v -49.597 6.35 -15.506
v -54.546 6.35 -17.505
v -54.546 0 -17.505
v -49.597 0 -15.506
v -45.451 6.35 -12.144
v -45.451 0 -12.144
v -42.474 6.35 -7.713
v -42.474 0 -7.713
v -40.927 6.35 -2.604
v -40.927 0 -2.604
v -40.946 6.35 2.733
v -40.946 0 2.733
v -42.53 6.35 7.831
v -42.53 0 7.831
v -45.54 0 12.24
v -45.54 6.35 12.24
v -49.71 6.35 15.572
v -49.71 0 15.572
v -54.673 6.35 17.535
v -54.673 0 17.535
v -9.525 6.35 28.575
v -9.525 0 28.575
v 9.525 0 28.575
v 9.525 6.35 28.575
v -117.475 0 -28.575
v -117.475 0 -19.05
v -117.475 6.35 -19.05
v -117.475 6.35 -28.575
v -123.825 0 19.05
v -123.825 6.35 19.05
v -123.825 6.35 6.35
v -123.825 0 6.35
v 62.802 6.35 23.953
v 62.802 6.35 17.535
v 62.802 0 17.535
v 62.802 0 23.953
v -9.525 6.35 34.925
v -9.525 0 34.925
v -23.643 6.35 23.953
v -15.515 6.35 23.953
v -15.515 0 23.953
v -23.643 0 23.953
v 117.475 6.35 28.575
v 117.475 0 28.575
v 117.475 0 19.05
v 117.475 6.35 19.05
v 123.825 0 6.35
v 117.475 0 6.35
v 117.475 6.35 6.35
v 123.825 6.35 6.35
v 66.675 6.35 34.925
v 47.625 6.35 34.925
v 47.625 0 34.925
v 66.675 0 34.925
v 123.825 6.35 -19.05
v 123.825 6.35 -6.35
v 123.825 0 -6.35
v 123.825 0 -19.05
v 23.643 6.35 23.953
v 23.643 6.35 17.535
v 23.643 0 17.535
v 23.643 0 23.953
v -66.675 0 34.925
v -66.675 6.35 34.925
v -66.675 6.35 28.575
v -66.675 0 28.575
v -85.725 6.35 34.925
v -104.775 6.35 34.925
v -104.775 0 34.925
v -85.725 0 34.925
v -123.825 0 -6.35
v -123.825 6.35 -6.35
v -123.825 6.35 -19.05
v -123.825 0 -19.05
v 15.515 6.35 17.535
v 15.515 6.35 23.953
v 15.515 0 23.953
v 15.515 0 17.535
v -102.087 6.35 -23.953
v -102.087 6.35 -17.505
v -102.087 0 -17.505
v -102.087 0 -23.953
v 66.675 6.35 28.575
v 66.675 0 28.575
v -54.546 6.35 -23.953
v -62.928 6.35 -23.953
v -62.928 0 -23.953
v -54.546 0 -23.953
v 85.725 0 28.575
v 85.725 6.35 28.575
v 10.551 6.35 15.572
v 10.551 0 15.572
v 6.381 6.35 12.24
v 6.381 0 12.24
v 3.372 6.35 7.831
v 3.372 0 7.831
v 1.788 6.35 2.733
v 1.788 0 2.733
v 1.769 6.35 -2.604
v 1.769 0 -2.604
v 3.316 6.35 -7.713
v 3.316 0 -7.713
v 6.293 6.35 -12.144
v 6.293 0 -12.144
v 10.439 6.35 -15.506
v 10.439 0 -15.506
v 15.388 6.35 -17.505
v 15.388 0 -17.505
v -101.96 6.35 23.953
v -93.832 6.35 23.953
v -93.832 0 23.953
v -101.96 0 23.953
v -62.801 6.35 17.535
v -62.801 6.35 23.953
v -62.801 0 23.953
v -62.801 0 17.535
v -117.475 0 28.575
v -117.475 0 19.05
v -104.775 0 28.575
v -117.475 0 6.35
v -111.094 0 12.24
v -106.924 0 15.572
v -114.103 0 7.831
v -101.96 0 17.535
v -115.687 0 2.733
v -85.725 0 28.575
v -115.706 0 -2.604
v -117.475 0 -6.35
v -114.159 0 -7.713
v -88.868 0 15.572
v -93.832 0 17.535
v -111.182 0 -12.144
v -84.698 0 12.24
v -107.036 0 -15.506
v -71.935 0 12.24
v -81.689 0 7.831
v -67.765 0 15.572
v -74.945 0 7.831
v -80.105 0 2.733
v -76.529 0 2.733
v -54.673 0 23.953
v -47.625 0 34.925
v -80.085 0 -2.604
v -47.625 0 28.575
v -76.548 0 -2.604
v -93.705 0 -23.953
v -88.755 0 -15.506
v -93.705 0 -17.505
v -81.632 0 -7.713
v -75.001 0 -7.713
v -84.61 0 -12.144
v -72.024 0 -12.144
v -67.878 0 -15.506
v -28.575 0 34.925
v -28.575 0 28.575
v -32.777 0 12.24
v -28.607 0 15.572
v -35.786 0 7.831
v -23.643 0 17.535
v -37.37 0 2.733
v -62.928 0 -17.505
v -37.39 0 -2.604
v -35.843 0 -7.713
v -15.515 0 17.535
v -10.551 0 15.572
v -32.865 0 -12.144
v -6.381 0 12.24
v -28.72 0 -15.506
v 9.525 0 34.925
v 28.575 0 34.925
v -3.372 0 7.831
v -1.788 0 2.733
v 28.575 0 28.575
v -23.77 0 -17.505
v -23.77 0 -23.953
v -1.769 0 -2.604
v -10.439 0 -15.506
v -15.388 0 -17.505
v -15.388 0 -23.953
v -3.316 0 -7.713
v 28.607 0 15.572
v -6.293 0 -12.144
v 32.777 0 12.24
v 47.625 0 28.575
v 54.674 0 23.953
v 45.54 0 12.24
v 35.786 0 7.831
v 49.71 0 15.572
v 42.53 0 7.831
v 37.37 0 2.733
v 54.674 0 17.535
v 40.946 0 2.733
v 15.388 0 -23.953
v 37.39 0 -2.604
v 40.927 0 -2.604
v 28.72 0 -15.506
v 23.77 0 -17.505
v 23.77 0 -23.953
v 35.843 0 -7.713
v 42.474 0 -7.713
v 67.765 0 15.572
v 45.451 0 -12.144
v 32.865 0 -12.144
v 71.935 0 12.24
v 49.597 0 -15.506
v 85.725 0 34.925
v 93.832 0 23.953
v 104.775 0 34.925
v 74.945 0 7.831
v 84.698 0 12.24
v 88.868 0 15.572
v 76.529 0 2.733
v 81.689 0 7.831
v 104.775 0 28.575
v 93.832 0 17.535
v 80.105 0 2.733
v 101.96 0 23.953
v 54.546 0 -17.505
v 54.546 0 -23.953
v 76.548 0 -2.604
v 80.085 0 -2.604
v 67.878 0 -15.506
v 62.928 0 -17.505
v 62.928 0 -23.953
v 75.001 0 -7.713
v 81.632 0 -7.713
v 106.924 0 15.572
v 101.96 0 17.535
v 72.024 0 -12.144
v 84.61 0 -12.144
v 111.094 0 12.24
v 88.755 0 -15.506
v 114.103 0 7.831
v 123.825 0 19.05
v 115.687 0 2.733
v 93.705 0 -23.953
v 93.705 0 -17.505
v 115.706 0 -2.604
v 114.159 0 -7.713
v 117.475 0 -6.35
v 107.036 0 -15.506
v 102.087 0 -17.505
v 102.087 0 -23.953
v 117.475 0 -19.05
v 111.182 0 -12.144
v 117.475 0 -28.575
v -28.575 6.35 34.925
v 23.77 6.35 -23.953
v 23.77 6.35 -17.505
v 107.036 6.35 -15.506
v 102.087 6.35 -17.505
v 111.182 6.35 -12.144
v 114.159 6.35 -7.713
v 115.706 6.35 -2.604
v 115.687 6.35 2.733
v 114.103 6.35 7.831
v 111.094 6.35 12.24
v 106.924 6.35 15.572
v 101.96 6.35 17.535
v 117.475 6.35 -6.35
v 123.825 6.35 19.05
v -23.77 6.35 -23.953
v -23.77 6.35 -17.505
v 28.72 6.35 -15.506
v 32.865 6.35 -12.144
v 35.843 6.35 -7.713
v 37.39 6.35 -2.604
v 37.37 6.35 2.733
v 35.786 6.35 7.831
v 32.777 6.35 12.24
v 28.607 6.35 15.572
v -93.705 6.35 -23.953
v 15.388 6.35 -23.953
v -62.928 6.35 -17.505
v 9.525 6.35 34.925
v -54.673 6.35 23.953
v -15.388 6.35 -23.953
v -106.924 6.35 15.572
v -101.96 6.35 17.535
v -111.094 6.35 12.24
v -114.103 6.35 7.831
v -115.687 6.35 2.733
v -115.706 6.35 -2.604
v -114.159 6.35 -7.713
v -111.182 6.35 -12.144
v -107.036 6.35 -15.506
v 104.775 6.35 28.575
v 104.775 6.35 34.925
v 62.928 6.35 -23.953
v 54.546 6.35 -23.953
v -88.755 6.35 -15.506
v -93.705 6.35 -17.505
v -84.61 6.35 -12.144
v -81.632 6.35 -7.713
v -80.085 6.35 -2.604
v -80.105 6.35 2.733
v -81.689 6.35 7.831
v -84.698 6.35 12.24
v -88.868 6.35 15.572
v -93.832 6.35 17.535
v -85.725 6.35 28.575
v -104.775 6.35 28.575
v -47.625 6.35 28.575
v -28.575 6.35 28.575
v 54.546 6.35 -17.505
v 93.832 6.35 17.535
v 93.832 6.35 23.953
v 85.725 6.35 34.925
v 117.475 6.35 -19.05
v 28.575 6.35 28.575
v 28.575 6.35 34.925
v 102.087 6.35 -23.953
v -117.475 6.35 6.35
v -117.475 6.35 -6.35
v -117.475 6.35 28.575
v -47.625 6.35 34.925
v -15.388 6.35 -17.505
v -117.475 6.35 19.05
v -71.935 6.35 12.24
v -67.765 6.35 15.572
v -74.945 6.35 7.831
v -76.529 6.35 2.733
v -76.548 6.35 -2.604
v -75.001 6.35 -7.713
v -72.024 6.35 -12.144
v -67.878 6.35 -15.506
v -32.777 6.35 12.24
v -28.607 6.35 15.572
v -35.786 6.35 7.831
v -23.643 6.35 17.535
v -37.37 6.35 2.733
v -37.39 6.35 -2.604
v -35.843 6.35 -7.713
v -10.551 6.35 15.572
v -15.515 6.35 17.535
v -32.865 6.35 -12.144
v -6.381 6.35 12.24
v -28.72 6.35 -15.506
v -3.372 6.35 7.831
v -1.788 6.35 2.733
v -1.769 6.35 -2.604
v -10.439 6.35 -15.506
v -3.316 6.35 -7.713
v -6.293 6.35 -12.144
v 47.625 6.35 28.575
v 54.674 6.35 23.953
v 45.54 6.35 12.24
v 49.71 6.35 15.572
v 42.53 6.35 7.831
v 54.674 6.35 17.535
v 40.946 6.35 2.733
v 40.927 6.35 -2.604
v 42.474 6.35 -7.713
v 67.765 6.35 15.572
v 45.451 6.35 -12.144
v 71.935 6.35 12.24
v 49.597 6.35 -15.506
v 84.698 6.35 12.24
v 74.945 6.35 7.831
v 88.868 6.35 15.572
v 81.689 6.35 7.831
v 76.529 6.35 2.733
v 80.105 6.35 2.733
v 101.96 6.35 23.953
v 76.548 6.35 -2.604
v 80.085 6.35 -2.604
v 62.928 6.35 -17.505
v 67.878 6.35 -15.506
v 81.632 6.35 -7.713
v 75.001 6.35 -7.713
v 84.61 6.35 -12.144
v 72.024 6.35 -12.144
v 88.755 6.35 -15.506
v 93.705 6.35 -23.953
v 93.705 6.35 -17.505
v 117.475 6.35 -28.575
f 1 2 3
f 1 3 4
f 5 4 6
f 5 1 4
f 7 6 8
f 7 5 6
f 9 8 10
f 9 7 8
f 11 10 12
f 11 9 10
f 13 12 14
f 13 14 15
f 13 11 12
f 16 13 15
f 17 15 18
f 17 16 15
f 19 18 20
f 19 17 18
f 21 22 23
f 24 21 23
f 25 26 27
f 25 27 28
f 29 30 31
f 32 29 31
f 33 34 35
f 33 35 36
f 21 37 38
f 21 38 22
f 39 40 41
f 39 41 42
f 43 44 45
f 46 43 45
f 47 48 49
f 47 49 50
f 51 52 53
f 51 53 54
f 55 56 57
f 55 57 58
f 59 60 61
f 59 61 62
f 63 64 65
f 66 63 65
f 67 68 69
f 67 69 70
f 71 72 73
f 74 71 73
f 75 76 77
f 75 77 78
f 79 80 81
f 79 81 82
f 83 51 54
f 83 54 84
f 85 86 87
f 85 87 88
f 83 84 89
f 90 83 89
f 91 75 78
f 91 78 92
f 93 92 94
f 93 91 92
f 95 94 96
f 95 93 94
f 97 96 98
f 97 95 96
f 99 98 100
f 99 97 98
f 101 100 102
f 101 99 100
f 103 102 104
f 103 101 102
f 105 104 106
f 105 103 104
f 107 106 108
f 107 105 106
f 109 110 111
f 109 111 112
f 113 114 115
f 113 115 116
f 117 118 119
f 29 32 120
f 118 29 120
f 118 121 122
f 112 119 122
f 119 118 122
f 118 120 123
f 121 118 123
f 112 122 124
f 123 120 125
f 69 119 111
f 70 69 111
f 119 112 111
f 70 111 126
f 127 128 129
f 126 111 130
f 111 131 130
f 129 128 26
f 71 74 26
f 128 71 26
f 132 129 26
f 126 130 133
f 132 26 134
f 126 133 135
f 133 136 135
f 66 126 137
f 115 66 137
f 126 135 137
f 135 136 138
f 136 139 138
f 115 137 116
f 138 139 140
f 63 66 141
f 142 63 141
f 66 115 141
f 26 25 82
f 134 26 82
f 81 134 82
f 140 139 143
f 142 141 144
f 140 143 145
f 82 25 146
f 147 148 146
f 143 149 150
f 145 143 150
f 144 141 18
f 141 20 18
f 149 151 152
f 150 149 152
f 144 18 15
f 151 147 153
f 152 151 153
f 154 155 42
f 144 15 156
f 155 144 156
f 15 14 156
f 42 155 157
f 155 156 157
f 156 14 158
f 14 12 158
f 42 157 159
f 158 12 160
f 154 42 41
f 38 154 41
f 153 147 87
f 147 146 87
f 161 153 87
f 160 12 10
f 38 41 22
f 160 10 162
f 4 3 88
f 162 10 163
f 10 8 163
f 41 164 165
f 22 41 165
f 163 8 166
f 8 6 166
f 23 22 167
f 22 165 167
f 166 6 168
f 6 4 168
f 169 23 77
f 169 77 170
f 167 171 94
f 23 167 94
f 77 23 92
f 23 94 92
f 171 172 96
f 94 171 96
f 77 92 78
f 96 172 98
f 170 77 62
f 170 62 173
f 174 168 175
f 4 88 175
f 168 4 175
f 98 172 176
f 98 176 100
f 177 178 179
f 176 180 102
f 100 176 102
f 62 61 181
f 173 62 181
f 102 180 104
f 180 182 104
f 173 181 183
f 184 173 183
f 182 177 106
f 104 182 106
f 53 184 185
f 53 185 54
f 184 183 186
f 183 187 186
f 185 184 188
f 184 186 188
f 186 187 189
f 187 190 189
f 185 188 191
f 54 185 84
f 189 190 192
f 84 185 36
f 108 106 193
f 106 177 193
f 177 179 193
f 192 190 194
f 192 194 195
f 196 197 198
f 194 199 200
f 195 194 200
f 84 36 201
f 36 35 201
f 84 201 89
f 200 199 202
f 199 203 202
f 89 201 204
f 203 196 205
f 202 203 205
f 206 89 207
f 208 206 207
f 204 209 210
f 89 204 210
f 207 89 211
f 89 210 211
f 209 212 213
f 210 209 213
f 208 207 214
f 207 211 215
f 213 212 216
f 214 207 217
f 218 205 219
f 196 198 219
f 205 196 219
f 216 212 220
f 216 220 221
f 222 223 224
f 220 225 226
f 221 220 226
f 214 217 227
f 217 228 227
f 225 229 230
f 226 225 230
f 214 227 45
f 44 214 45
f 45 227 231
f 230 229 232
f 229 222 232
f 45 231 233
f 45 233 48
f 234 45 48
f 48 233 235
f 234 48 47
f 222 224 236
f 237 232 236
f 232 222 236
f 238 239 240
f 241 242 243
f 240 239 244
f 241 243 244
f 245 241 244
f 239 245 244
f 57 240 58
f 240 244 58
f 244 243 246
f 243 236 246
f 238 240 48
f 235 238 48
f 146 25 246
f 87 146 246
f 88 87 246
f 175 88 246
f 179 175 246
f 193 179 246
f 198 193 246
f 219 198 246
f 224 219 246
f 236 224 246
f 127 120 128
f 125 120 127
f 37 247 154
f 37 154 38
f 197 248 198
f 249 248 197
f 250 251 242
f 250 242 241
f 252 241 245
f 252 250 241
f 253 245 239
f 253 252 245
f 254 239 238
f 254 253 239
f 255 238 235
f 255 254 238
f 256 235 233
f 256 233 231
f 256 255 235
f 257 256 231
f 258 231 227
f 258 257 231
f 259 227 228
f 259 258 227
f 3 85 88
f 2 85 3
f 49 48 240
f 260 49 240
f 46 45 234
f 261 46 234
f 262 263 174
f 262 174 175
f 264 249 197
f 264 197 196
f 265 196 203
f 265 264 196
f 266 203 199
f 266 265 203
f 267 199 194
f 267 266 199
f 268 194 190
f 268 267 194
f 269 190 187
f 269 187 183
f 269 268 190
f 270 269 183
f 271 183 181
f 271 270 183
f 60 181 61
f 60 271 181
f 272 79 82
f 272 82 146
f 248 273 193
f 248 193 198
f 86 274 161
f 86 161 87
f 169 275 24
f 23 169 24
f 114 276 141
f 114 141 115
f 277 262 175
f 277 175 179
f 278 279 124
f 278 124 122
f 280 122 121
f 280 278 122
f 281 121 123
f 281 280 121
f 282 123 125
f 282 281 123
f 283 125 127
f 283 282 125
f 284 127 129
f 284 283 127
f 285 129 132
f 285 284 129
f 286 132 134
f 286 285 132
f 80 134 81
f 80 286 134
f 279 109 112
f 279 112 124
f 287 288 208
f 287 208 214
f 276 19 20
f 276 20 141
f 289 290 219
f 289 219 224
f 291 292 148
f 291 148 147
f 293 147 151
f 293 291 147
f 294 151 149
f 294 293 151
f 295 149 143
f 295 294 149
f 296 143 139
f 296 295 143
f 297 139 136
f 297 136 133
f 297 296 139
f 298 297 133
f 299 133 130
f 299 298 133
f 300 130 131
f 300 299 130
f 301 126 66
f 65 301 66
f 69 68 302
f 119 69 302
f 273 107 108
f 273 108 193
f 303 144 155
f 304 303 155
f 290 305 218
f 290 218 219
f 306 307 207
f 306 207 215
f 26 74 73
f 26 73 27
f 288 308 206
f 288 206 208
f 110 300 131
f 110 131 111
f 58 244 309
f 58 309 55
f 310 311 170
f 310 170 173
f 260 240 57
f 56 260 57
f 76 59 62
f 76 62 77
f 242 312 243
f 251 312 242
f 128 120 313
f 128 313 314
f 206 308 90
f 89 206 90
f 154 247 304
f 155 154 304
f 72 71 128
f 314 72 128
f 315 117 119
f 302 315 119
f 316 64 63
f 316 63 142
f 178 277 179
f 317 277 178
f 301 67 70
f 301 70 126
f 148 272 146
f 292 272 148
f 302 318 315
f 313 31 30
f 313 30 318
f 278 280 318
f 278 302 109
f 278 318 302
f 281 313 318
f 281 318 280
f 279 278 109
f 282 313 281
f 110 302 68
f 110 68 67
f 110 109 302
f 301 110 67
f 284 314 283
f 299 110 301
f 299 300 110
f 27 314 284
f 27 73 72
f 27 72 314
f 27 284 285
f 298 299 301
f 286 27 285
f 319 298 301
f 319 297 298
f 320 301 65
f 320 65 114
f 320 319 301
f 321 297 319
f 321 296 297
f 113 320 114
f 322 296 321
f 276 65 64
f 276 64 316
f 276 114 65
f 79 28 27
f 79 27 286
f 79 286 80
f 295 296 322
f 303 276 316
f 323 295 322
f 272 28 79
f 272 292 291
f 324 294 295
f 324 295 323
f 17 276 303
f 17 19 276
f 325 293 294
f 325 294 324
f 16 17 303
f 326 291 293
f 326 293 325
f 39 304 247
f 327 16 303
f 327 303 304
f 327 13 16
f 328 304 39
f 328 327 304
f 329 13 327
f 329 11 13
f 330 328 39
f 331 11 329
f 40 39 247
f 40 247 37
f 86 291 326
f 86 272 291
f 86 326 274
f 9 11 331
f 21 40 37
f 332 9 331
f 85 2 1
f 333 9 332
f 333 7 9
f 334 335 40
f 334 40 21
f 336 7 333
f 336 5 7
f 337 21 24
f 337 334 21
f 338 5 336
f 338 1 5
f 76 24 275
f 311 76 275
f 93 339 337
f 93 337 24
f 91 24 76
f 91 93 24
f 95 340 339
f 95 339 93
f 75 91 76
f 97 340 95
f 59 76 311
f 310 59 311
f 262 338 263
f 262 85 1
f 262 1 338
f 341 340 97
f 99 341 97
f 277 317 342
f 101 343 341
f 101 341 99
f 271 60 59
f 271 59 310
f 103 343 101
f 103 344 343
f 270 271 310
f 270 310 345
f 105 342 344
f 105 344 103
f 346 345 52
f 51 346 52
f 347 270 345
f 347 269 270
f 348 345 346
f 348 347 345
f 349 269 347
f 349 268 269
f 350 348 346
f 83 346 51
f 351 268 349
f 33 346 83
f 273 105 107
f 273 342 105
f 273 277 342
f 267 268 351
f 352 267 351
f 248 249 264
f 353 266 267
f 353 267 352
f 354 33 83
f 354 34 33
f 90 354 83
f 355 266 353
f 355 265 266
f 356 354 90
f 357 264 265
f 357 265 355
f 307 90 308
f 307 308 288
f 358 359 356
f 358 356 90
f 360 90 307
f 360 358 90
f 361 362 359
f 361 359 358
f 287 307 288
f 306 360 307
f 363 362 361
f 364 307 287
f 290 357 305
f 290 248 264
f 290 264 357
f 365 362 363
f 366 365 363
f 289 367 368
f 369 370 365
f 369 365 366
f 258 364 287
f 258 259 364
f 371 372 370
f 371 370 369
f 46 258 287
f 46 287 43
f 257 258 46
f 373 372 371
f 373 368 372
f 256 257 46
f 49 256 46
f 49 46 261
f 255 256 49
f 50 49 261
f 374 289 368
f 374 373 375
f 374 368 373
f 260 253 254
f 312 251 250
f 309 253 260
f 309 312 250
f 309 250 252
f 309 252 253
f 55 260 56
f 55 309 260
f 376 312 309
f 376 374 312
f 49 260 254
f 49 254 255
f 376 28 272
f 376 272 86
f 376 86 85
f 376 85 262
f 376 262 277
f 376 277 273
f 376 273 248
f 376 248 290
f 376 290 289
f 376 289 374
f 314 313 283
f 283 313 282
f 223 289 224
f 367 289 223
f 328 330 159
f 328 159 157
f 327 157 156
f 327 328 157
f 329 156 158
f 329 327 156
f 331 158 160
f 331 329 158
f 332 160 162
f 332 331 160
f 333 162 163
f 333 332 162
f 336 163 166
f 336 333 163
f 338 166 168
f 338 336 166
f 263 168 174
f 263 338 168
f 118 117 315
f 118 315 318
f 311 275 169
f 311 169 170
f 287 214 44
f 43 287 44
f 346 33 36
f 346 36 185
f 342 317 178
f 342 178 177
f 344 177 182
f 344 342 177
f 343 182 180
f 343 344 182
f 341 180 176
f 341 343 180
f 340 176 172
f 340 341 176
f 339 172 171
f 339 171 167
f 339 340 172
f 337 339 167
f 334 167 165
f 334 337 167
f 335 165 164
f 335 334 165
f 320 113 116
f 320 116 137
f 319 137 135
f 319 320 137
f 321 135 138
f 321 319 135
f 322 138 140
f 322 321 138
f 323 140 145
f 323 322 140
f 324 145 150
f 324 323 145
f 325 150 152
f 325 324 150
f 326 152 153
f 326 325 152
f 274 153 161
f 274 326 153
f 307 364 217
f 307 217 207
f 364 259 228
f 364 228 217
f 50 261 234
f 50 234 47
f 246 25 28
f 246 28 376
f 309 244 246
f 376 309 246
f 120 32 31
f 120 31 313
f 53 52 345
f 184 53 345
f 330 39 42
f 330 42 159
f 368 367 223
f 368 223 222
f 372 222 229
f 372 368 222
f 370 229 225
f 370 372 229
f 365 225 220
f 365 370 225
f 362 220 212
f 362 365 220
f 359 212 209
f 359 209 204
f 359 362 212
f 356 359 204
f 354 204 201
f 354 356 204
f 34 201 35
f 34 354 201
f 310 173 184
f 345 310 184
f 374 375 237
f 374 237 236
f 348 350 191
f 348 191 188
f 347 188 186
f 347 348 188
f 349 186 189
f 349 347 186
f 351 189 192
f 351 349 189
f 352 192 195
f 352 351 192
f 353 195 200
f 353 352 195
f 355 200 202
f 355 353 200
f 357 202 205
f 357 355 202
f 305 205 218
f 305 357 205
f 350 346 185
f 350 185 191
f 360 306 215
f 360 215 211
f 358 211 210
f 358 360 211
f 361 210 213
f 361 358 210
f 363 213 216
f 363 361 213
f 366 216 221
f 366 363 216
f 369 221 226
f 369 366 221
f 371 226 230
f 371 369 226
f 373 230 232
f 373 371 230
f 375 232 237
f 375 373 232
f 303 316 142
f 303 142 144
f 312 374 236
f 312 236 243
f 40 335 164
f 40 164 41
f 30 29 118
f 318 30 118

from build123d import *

# Parameters (mm, degrees)
ESQUISSE1_W                     = 234.95
ESQUISSE1_H                     = 57.15
BOSS_EXTRU_1_DEPTH              = 6.35
ENL_V_MAT_EXTRU_1_DEPTH         = 6.35
R_P_TITION_LIN_AIRE1_COUNT      = 6
R_P_TITION_LIN_AIRE1_PITCH      = 39.158333333
ESQUISSE3_W                     = 19.05
ESQUISSE3_H                     = 6.35
BOSS_EXTRU_2_DEPTH              = 6.35
R_P_TITION_LIN_AIRE2_COUNT      = 6
R_P_TITION_LIN_AIRE2_PITCH      = 38.1
ESQUISSE5_W                     = 6.35
ESQUISSE5_H                     = 12.7
BOSS_EXTRU_4_DEPTH              = 6.35
R_P_TITION_LIN_AIRE4_COUNT      = 2
R_P_TITION_LIN_AIRE4_PITCH      = 25.4
R_P_TITION_LIN_AIRE4_COUNT_DIR2 = 2
R_P_TITION_LIN_AIRE4_PITCH_DIR2 = 241.3


with BuildPart() as part:
    # Esquisse1 → Boss.-Extru.1 (new body)
    with BuildSketch(Plane(origin=(0, 0, 0), x_dir=(1, 0, 0), z_dir=(0, 1, 0))):
        Rectangle(ESQUISSE1_W, ESQUISSE1_H)
    extrude(amount=BOSS_EXTRU_1_DEPTH)

    # Esquisse2 → Enlèv. mat.-Extru.1 (cut)
    with BuildSketch(Plane(origin=(0, 6.35, 0), x_dir=(1, 0, 0), z_dir=(0, 1, 0))):
        with BuildLine():
            Line((93.704833333, 17.50529974), (93.704833333, 23.953124941))
            Line((93.704833333, 23.953124941), (102.086833333, 23.953124941))
            Line((102.086833333, 23.953124941), (102.086833333, 17.50529974))
            ThreePointArc((102.086833333, 17.50529974), (115.89571511, -0.065238332), (101.959833333, -17.535218961))
            Line((101.959833333, -17.535218961), (101.959833333, -23.953124941))
            Line((101.959833333, -23.953124941), (93.831833333, -23.953124941))
            Line((93.831833333, -23.953124941), (93.831833333, -17.535218961))
            ThreePointArc((93.831833333, -17.535218961), (79.895951557, -0.065238332), (93.704833333, 17.50529974))
        make_face()
    enl_v_mat_extru_1 = extrude(amount=-ENL_V_MAT_EXTRU_1_DEPTH, mode=Mode.SUBTRACT)

    # Répétition linéaire1: Enlèv. mat.-Extru.1 ×6
    with Locations(*[(-i * R_P_TITION_LIN_AIRE1_PITCH, 0, 0) for i in range(1, R_P_TITION_LIN_AIRE1_COUNT)]):
        add(enl_v_mat_extru_1, mode=Mode.SUBTRACT)

    # Esquisse3 → Boss.-Extru.2 (add)
    with BuildSketch(Plane(origin=(0, 6.35, 0), x_dir=(1, 0, 0), z_dir=(0, 1, 0))):
        with Locations((-95.25, -31.75)):
            Rectangle(ESQUISSE3_W, ESQUISSE3_H)
    boss_extru_2 = extrude(amount=-BOSS_EXTRU_2_DEPTH)

    # Répétition linéaire2: Boss.-Extru.2 ×6
    with Locations(*[(i * R_P_TITION_LIN_AIRE2_PITCH, 0, 0) for i in range(1, R_P_TITION_LIN_AIRE2_COUNT)]):
        add(boss_extru_2)

    # Esquisse5 → Boss.-Extru.4 (add)
    with BuildSketch(Plane(origin=(0, 6.35, 0), x_dir=(1, 0, 0), z_dir=(0, 1, 0))):
        with Locations((-120.65, -12.7)):
            Rectangle(ESQUISSE5_W, ESQUISSE5_H)
    boss_extru_4 = extrude(amount=-BOSS_EXTRU_4_DEPTH)

    # Répétition linéaire4: Boss.-Extru.4 2 × 2
    with Locations(*[(j * R_P_TITION_LIN_AIRE4_PITCH_DIR2, 0, -i * R_P_TITION_LIN_AIRE4_PITCH) for i in range(R_P_TITION_LIN_AIRE4_COUNT) for j in range(R_P_TITION_LIN_AIRE4_COUNT_DIR2) if (i, j) != (0, 0)]):
        add(boss_extru_4)


solid = part.part
